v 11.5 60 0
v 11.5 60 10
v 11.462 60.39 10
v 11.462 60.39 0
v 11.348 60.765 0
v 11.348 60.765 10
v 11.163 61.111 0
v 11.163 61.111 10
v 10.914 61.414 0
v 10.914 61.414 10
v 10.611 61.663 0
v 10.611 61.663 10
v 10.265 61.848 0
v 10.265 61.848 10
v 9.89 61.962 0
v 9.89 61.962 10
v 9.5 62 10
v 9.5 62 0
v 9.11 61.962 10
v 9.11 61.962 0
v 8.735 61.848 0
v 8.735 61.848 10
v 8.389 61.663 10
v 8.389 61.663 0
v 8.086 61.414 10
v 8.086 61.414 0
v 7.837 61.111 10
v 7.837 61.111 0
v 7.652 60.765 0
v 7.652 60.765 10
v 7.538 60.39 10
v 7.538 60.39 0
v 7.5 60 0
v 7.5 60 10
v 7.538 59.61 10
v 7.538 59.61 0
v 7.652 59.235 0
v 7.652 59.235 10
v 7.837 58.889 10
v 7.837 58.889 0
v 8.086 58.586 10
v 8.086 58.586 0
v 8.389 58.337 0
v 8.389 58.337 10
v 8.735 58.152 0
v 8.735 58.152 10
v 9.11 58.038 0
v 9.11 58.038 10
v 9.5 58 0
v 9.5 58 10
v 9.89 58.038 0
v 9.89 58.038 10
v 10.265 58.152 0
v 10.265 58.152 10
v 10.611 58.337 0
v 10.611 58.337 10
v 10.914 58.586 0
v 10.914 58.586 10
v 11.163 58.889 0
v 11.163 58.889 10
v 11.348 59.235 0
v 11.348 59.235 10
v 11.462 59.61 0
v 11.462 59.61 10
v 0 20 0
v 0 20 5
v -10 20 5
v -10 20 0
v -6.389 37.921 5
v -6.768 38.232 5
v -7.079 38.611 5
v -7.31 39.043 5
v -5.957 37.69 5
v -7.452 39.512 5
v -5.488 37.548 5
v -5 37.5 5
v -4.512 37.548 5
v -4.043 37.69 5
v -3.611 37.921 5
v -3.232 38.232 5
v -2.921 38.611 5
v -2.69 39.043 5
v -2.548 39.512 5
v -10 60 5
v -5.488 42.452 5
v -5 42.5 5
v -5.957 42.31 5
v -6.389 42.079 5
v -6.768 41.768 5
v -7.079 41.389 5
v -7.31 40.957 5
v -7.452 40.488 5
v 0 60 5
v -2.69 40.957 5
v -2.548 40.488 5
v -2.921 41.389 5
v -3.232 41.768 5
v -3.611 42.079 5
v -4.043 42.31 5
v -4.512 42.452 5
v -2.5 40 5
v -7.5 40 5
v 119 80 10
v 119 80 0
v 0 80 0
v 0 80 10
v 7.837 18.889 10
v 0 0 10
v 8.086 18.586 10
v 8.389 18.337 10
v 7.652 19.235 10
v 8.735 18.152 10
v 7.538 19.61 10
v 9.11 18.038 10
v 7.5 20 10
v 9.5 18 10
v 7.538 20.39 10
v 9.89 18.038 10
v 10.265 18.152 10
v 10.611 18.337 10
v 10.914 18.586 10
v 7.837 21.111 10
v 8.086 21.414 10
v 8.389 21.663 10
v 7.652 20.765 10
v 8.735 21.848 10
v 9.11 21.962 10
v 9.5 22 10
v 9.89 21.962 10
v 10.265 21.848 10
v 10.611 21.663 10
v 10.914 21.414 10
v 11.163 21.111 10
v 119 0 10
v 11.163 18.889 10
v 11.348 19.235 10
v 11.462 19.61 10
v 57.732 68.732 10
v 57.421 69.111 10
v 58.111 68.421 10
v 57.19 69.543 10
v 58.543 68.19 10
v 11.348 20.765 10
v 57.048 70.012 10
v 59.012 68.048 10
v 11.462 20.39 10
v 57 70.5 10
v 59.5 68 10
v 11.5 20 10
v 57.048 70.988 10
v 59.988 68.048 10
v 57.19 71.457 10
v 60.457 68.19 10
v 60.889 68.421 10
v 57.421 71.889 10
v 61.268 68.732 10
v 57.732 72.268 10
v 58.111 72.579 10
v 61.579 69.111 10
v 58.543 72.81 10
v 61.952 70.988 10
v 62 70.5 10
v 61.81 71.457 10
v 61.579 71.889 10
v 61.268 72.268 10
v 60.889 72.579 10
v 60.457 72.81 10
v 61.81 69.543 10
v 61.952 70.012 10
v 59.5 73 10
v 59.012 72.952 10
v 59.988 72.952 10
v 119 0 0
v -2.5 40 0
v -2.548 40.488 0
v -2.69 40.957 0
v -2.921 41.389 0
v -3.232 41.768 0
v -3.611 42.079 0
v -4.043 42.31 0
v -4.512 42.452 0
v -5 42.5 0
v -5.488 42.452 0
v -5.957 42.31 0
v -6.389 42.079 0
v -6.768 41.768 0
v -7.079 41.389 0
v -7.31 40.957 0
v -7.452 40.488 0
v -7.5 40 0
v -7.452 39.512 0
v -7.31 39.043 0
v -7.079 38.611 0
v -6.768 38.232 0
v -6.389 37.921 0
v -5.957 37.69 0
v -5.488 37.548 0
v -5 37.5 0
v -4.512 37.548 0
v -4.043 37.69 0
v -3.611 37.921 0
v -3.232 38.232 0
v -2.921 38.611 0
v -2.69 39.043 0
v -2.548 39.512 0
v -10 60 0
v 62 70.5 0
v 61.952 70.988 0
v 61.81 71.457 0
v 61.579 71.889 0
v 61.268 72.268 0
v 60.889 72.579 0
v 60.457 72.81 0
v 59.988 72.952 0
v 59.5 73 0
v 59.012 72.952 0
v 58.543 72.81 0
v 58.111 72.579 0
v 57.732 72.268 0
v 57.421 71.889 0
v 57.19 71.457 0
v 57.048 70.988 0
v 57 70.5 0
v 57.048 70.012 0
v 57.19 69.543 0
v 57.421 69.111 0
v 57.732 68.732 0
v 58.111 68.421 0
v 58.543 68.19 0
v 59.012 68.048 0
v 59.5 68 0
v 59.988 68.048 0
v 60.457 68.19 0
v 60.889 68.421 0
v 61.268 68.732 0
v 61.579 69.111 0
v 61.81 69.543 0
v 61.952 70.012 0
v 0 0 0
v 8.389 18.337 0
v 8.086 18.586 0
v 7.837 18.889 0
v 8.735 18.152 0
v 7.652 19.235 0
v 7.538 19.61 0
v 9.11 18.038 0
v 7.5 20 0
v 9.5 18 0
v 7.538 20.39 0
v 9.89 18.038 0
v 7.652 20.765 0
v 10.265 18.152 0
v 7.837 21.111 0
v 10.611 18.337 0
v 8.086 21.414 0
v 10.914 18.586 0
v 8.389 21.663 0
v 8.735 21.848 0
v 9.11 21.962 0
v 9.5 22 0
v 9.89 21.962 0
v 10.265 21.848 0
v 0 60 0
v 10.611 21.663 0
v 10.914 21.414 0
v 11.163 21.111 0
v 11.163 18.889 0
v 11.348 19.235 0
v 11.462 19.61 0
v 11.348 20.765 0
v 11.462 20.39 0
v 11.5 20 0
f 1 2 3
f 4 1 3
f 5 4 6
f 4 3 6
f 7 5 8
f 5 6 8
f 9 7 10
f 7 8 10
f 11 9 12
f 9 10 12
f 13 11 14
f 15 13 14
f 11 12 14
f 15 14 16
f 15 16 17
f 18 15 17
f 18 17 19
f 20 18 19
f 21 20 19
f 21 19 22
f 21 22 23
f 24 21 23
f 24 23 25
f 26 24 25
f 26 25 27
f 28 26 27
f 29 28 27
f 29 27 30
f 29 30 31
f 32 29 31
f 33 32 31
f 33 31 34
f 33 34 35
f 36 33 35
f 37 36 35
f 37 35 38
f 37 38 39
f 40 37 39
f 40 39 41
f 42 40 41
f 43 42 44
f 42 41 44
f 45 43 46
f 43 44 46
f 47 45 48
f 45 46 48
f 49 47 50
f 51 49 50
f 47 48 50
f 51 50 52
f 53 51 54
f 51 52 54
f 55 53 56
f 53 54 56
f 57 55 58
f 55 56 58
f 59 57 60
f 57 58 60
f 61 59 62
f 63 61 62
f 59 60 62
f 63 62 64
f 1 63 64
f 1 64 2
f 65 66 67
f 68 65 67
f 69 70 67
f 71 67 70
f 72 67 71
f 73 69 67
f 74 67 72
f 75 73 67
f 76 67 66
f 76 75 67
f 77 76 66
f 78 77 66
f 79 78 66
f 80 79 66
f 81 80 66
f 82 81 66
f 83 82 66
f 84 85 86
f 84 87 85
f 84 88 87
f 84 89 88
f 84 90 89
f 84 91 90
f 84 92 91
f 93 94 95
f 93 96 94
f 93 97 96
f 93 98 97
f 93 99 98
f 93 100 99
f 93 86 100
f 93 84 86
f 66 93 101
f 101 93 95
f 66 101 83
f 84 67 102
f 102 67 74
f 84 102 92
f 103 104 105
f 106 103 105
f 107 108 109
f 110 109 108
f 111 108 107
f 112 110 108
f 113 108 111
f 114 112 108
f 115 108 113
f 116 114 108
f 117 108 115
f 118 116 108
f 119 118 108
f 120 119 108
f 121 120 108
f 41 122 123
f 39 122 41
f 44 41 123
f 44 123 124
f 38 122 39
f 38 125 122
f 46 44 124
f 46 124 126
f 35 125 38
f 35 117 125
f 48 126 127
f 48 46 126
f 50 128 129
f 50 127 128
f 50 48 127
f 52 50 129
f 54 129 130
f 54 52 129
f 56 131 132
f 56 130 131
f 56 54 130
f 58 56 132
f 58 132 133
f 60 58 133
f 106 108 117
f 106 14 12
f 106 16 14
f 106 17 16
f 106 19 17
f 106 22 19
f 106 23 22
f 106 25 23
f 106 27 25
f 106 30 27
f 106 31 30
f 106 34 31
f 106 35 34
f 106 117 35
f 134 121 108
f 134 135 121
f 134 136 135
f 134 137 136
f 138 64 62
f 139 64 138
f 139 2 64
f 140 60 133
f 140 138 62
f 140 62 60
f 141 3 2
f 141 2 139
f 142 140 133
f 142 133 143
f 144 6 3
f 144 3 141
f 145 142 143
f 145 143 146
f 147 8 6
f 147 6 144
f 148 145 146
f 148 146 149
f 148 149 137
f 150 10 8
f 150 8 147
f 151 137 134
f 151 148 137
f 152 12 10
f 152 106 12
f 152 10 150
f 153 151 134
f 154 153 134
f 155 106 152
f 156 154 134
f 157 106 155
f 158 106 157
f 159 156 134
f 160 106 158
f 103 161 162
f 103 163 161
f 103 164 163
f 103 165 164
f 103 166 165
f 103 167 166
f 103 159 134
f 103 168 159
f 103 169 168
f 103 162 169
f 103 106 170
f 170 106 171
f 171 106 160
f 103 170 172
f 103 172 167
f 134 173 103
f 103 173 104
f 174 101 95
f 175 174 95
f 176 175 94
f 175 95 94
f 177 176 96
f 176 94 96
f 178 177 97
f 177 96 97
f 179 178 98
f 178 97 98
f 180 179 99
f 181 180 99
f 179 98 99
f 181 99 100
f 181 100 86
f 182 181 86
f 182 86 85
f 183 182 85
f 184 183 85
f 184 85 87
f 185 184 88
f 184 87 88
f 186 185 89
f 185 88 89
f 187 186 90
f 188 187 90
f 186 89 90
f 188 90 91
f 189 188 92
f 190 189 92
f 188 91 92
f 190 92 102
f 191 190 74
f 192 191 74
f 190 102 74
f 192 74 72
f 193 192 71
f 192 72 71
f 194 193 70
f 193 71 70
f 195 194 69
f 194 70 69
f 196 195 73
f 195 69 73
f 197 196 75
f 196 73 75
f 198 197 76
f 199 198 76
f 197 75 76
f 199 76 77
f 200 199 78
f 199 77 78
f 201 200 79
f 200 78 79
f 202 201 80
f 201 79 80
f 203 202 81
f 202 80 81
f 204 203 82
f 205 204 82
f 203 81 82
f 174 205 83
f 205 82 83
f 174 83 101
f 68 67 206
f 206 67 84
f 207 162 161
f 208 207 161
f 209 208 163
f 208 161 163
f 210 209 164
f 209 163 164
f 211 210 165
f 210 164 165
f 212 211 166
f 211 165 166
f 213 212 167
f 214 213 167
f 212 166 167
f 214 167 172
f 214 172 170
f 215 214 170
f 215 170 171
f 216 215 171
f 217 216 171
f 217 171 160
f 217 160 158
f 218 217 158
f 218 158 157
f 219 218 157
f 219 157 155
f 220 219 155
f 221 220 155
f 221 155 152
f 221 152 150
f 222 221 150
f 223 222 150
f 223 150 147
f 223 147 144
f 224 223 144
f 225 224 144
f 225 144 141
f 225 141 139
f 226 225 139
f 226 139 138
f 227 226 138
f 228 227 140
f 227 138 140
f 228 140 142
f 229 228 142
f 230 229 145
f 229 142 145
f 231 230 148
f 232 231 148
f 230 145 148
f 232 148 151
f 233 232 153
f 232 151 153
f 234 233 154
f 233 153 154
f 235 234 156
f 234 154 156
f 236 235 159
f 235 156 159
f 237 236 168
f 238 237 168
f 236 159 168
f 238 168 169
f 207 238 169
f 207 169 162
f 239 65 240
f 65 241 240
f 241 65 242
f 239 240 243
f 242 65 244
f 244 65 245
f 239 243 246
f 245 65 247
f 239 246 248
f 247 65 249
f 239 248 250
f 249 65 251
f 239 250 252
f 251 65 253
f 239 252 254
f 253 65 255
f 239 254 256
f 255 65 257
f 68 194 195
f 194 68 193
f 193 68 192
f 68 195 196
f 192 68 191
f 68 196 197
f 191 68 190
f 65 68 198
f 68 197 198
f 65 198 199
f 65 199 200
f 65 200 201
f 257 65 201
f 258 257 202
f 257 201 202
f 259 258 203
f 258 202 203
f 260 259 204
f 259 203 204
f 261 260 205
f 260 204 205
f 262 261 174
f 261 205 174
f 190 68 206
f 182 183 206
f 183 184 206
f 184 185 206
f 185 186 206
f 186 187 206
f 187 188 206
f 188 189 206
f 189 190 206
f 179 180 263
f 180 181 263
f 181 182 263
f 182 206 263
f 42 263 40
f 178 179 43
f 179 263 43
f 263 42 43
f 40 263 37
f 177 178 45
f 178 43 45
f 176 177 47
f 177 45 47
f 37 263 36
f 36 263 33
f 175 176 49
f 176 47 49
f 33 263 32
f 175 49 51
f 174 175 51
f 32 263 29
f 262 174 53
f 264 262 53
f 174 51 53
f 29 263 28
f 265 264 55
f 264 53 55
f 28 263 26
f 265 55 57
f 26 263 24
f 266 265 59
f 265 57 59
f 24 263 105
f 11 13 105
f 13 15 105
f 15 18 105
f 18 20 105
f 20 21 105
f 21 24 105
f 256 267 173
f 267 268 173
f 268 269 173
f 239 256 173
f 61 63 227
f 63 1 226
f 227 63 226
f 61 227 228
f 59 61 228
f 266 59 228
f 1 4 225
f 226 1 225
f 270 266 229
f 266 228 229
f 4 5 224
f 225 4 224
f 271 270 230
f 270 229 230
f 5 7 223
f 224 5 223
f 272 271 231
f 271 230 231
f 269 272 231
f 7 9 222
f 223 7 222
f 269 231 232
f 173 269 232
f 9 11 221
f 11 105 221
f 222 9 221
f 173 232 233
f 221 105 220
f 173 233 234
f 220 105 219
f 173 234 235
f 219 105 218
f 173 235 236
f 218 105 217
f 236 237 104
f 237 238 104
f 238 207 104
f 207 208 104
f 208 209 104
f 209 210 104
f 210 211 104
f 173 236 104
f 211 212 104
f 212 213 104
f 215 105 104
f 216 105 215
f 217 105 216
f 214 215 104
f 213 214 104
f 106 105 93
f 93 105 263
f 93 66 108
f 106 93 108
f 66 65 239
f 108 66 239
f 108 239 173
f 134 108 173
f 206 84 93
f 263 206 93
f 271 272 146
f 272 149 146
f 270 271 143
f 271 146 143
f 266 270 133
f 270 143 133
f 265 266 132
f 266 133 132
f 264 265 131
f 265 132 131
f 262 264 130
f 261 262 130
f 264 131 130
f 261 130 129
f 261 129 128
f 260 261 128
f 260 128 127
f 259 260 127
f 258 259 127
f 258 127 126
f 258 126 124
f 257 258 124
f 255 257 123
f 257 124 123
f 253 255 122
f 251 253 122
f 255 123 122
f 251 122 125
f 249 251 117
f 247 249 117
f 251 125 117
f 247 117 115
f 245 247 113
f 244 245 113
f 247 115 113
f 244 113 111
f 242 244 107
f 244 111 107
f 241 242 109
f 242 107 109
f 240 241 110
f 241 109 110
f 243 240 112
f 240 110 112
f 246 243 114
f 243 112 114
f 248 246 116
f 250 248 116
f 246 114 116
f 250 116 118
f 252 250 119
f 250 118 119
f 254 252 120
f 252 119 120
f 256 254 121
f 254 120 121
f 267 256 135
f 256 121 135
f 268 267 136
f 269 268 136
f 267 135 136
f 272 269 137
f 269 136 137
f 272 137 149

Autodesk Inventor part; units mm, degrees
ref_plane "YZ Plane" through (0, 0, 0) normal (1, 0, 0) x (0, 1, 0)
ref_plane "XZ Plane" through (0, 0, 0) normal (0, 1, 0) x (-1, 0, 0)
ref_plane "XY Plane" through (0, 0, 0) normal (0, 0, 1) x (1, 0, 0)
sketch "Sketch1" plane through (0, 0, 0) normal (0, 0, 1) x (1, 0, 0)
  line L0 (0, 0) -> (119, 0)
  line L1 (119, 0) -> (119, 80)
  line L2 (119, 80) -> (0, 80)
  line L3 (0, 80) -> (0, 0)
  dimension "d0" = 119
  dimension "d1" = 80
extrude "Extrusion1" add sketch "Sketch1" along normal blind 10
sketch "Sketch2" plane through (0, 0, 10) normal (0, 0, 1) x (1, 0, 0)
  line L0 (-10, 60) -> (0, 60)
  line L1 (0, 60) -> (0, 20)
  line L2 (0, 20) -> (-10, 20)
  line L3 (-10, 20) -> (-10, 60)
  line L4 (0, 80) -> (0, 0) projected
  circle A0 centre (-5, 40) radius 2.5
  point P0 (0, 40)
  point P1 (0, 40)
  point P2 (0, 40)
  point P3 (0, 40)
  point P4 (-5, 60)
  dimension "d4" = 10
  dimension "d5" = 40
  dimension "d6" = 5
extrude "Extrusion2" add sketch "Sketch2" against normal blind 10
sketch "Sketch3" plane through (0, 0, 10) normal (0, 0, 1) x (1, 0, 0)
  circle A0 centre (9.5, 60) radius 2
  line L0 (0, 80) -> (0, 60) projected
  line L1 (119, 80) -> (0, 80) projected
  circle A1 centre (9.5, 20) radius 2
  point P0 (0, 0)
  dimension "d12" = 4
  dimension "d13" = 9.5
  dimension "d14" = 20
  dimension "d15" = 4
  dimension "d16" = 40
extrude "Extrusion3" cut sketch "Sketch3" against normal through all
sketch "Sketch4" plane through (0, 0, 10) normal (0, 0, 1) x (1, 0, 0)
  line L0 (0, 80) -> (0, 60) projected
  line L1 (0, 20) -> (-10, 20) projected
  line L2 (0, 60) -> (-10, 60)
  line L3 (-10, 60) -> (-10, 20)
  line L4 (-10, 20) -> (0, 20)
  line L5 (0, 20) -> (0, 60)
  point P0 (0, 0)
extrude "Extrusion4" cut sketch "Sketch4" against normal blind 5
sketch "Sketch5" plane through (0, 0, 10) normal (0, 0, 1) x (1, 0, 0)
  circle A0 centre (59.5, 70.5) radius 2.5
  line L0 (119, 80) -> (0, 80) projected
  point P0 (0, 0)
  point P1 (59.5, 80)
  dimension "d21" = 5
  dimension "d22" = 9.5
extrude "Extrusion5" cut sketch "Sketch5" against normal through all
properties part number "SP001" material "ABS Plastic"
